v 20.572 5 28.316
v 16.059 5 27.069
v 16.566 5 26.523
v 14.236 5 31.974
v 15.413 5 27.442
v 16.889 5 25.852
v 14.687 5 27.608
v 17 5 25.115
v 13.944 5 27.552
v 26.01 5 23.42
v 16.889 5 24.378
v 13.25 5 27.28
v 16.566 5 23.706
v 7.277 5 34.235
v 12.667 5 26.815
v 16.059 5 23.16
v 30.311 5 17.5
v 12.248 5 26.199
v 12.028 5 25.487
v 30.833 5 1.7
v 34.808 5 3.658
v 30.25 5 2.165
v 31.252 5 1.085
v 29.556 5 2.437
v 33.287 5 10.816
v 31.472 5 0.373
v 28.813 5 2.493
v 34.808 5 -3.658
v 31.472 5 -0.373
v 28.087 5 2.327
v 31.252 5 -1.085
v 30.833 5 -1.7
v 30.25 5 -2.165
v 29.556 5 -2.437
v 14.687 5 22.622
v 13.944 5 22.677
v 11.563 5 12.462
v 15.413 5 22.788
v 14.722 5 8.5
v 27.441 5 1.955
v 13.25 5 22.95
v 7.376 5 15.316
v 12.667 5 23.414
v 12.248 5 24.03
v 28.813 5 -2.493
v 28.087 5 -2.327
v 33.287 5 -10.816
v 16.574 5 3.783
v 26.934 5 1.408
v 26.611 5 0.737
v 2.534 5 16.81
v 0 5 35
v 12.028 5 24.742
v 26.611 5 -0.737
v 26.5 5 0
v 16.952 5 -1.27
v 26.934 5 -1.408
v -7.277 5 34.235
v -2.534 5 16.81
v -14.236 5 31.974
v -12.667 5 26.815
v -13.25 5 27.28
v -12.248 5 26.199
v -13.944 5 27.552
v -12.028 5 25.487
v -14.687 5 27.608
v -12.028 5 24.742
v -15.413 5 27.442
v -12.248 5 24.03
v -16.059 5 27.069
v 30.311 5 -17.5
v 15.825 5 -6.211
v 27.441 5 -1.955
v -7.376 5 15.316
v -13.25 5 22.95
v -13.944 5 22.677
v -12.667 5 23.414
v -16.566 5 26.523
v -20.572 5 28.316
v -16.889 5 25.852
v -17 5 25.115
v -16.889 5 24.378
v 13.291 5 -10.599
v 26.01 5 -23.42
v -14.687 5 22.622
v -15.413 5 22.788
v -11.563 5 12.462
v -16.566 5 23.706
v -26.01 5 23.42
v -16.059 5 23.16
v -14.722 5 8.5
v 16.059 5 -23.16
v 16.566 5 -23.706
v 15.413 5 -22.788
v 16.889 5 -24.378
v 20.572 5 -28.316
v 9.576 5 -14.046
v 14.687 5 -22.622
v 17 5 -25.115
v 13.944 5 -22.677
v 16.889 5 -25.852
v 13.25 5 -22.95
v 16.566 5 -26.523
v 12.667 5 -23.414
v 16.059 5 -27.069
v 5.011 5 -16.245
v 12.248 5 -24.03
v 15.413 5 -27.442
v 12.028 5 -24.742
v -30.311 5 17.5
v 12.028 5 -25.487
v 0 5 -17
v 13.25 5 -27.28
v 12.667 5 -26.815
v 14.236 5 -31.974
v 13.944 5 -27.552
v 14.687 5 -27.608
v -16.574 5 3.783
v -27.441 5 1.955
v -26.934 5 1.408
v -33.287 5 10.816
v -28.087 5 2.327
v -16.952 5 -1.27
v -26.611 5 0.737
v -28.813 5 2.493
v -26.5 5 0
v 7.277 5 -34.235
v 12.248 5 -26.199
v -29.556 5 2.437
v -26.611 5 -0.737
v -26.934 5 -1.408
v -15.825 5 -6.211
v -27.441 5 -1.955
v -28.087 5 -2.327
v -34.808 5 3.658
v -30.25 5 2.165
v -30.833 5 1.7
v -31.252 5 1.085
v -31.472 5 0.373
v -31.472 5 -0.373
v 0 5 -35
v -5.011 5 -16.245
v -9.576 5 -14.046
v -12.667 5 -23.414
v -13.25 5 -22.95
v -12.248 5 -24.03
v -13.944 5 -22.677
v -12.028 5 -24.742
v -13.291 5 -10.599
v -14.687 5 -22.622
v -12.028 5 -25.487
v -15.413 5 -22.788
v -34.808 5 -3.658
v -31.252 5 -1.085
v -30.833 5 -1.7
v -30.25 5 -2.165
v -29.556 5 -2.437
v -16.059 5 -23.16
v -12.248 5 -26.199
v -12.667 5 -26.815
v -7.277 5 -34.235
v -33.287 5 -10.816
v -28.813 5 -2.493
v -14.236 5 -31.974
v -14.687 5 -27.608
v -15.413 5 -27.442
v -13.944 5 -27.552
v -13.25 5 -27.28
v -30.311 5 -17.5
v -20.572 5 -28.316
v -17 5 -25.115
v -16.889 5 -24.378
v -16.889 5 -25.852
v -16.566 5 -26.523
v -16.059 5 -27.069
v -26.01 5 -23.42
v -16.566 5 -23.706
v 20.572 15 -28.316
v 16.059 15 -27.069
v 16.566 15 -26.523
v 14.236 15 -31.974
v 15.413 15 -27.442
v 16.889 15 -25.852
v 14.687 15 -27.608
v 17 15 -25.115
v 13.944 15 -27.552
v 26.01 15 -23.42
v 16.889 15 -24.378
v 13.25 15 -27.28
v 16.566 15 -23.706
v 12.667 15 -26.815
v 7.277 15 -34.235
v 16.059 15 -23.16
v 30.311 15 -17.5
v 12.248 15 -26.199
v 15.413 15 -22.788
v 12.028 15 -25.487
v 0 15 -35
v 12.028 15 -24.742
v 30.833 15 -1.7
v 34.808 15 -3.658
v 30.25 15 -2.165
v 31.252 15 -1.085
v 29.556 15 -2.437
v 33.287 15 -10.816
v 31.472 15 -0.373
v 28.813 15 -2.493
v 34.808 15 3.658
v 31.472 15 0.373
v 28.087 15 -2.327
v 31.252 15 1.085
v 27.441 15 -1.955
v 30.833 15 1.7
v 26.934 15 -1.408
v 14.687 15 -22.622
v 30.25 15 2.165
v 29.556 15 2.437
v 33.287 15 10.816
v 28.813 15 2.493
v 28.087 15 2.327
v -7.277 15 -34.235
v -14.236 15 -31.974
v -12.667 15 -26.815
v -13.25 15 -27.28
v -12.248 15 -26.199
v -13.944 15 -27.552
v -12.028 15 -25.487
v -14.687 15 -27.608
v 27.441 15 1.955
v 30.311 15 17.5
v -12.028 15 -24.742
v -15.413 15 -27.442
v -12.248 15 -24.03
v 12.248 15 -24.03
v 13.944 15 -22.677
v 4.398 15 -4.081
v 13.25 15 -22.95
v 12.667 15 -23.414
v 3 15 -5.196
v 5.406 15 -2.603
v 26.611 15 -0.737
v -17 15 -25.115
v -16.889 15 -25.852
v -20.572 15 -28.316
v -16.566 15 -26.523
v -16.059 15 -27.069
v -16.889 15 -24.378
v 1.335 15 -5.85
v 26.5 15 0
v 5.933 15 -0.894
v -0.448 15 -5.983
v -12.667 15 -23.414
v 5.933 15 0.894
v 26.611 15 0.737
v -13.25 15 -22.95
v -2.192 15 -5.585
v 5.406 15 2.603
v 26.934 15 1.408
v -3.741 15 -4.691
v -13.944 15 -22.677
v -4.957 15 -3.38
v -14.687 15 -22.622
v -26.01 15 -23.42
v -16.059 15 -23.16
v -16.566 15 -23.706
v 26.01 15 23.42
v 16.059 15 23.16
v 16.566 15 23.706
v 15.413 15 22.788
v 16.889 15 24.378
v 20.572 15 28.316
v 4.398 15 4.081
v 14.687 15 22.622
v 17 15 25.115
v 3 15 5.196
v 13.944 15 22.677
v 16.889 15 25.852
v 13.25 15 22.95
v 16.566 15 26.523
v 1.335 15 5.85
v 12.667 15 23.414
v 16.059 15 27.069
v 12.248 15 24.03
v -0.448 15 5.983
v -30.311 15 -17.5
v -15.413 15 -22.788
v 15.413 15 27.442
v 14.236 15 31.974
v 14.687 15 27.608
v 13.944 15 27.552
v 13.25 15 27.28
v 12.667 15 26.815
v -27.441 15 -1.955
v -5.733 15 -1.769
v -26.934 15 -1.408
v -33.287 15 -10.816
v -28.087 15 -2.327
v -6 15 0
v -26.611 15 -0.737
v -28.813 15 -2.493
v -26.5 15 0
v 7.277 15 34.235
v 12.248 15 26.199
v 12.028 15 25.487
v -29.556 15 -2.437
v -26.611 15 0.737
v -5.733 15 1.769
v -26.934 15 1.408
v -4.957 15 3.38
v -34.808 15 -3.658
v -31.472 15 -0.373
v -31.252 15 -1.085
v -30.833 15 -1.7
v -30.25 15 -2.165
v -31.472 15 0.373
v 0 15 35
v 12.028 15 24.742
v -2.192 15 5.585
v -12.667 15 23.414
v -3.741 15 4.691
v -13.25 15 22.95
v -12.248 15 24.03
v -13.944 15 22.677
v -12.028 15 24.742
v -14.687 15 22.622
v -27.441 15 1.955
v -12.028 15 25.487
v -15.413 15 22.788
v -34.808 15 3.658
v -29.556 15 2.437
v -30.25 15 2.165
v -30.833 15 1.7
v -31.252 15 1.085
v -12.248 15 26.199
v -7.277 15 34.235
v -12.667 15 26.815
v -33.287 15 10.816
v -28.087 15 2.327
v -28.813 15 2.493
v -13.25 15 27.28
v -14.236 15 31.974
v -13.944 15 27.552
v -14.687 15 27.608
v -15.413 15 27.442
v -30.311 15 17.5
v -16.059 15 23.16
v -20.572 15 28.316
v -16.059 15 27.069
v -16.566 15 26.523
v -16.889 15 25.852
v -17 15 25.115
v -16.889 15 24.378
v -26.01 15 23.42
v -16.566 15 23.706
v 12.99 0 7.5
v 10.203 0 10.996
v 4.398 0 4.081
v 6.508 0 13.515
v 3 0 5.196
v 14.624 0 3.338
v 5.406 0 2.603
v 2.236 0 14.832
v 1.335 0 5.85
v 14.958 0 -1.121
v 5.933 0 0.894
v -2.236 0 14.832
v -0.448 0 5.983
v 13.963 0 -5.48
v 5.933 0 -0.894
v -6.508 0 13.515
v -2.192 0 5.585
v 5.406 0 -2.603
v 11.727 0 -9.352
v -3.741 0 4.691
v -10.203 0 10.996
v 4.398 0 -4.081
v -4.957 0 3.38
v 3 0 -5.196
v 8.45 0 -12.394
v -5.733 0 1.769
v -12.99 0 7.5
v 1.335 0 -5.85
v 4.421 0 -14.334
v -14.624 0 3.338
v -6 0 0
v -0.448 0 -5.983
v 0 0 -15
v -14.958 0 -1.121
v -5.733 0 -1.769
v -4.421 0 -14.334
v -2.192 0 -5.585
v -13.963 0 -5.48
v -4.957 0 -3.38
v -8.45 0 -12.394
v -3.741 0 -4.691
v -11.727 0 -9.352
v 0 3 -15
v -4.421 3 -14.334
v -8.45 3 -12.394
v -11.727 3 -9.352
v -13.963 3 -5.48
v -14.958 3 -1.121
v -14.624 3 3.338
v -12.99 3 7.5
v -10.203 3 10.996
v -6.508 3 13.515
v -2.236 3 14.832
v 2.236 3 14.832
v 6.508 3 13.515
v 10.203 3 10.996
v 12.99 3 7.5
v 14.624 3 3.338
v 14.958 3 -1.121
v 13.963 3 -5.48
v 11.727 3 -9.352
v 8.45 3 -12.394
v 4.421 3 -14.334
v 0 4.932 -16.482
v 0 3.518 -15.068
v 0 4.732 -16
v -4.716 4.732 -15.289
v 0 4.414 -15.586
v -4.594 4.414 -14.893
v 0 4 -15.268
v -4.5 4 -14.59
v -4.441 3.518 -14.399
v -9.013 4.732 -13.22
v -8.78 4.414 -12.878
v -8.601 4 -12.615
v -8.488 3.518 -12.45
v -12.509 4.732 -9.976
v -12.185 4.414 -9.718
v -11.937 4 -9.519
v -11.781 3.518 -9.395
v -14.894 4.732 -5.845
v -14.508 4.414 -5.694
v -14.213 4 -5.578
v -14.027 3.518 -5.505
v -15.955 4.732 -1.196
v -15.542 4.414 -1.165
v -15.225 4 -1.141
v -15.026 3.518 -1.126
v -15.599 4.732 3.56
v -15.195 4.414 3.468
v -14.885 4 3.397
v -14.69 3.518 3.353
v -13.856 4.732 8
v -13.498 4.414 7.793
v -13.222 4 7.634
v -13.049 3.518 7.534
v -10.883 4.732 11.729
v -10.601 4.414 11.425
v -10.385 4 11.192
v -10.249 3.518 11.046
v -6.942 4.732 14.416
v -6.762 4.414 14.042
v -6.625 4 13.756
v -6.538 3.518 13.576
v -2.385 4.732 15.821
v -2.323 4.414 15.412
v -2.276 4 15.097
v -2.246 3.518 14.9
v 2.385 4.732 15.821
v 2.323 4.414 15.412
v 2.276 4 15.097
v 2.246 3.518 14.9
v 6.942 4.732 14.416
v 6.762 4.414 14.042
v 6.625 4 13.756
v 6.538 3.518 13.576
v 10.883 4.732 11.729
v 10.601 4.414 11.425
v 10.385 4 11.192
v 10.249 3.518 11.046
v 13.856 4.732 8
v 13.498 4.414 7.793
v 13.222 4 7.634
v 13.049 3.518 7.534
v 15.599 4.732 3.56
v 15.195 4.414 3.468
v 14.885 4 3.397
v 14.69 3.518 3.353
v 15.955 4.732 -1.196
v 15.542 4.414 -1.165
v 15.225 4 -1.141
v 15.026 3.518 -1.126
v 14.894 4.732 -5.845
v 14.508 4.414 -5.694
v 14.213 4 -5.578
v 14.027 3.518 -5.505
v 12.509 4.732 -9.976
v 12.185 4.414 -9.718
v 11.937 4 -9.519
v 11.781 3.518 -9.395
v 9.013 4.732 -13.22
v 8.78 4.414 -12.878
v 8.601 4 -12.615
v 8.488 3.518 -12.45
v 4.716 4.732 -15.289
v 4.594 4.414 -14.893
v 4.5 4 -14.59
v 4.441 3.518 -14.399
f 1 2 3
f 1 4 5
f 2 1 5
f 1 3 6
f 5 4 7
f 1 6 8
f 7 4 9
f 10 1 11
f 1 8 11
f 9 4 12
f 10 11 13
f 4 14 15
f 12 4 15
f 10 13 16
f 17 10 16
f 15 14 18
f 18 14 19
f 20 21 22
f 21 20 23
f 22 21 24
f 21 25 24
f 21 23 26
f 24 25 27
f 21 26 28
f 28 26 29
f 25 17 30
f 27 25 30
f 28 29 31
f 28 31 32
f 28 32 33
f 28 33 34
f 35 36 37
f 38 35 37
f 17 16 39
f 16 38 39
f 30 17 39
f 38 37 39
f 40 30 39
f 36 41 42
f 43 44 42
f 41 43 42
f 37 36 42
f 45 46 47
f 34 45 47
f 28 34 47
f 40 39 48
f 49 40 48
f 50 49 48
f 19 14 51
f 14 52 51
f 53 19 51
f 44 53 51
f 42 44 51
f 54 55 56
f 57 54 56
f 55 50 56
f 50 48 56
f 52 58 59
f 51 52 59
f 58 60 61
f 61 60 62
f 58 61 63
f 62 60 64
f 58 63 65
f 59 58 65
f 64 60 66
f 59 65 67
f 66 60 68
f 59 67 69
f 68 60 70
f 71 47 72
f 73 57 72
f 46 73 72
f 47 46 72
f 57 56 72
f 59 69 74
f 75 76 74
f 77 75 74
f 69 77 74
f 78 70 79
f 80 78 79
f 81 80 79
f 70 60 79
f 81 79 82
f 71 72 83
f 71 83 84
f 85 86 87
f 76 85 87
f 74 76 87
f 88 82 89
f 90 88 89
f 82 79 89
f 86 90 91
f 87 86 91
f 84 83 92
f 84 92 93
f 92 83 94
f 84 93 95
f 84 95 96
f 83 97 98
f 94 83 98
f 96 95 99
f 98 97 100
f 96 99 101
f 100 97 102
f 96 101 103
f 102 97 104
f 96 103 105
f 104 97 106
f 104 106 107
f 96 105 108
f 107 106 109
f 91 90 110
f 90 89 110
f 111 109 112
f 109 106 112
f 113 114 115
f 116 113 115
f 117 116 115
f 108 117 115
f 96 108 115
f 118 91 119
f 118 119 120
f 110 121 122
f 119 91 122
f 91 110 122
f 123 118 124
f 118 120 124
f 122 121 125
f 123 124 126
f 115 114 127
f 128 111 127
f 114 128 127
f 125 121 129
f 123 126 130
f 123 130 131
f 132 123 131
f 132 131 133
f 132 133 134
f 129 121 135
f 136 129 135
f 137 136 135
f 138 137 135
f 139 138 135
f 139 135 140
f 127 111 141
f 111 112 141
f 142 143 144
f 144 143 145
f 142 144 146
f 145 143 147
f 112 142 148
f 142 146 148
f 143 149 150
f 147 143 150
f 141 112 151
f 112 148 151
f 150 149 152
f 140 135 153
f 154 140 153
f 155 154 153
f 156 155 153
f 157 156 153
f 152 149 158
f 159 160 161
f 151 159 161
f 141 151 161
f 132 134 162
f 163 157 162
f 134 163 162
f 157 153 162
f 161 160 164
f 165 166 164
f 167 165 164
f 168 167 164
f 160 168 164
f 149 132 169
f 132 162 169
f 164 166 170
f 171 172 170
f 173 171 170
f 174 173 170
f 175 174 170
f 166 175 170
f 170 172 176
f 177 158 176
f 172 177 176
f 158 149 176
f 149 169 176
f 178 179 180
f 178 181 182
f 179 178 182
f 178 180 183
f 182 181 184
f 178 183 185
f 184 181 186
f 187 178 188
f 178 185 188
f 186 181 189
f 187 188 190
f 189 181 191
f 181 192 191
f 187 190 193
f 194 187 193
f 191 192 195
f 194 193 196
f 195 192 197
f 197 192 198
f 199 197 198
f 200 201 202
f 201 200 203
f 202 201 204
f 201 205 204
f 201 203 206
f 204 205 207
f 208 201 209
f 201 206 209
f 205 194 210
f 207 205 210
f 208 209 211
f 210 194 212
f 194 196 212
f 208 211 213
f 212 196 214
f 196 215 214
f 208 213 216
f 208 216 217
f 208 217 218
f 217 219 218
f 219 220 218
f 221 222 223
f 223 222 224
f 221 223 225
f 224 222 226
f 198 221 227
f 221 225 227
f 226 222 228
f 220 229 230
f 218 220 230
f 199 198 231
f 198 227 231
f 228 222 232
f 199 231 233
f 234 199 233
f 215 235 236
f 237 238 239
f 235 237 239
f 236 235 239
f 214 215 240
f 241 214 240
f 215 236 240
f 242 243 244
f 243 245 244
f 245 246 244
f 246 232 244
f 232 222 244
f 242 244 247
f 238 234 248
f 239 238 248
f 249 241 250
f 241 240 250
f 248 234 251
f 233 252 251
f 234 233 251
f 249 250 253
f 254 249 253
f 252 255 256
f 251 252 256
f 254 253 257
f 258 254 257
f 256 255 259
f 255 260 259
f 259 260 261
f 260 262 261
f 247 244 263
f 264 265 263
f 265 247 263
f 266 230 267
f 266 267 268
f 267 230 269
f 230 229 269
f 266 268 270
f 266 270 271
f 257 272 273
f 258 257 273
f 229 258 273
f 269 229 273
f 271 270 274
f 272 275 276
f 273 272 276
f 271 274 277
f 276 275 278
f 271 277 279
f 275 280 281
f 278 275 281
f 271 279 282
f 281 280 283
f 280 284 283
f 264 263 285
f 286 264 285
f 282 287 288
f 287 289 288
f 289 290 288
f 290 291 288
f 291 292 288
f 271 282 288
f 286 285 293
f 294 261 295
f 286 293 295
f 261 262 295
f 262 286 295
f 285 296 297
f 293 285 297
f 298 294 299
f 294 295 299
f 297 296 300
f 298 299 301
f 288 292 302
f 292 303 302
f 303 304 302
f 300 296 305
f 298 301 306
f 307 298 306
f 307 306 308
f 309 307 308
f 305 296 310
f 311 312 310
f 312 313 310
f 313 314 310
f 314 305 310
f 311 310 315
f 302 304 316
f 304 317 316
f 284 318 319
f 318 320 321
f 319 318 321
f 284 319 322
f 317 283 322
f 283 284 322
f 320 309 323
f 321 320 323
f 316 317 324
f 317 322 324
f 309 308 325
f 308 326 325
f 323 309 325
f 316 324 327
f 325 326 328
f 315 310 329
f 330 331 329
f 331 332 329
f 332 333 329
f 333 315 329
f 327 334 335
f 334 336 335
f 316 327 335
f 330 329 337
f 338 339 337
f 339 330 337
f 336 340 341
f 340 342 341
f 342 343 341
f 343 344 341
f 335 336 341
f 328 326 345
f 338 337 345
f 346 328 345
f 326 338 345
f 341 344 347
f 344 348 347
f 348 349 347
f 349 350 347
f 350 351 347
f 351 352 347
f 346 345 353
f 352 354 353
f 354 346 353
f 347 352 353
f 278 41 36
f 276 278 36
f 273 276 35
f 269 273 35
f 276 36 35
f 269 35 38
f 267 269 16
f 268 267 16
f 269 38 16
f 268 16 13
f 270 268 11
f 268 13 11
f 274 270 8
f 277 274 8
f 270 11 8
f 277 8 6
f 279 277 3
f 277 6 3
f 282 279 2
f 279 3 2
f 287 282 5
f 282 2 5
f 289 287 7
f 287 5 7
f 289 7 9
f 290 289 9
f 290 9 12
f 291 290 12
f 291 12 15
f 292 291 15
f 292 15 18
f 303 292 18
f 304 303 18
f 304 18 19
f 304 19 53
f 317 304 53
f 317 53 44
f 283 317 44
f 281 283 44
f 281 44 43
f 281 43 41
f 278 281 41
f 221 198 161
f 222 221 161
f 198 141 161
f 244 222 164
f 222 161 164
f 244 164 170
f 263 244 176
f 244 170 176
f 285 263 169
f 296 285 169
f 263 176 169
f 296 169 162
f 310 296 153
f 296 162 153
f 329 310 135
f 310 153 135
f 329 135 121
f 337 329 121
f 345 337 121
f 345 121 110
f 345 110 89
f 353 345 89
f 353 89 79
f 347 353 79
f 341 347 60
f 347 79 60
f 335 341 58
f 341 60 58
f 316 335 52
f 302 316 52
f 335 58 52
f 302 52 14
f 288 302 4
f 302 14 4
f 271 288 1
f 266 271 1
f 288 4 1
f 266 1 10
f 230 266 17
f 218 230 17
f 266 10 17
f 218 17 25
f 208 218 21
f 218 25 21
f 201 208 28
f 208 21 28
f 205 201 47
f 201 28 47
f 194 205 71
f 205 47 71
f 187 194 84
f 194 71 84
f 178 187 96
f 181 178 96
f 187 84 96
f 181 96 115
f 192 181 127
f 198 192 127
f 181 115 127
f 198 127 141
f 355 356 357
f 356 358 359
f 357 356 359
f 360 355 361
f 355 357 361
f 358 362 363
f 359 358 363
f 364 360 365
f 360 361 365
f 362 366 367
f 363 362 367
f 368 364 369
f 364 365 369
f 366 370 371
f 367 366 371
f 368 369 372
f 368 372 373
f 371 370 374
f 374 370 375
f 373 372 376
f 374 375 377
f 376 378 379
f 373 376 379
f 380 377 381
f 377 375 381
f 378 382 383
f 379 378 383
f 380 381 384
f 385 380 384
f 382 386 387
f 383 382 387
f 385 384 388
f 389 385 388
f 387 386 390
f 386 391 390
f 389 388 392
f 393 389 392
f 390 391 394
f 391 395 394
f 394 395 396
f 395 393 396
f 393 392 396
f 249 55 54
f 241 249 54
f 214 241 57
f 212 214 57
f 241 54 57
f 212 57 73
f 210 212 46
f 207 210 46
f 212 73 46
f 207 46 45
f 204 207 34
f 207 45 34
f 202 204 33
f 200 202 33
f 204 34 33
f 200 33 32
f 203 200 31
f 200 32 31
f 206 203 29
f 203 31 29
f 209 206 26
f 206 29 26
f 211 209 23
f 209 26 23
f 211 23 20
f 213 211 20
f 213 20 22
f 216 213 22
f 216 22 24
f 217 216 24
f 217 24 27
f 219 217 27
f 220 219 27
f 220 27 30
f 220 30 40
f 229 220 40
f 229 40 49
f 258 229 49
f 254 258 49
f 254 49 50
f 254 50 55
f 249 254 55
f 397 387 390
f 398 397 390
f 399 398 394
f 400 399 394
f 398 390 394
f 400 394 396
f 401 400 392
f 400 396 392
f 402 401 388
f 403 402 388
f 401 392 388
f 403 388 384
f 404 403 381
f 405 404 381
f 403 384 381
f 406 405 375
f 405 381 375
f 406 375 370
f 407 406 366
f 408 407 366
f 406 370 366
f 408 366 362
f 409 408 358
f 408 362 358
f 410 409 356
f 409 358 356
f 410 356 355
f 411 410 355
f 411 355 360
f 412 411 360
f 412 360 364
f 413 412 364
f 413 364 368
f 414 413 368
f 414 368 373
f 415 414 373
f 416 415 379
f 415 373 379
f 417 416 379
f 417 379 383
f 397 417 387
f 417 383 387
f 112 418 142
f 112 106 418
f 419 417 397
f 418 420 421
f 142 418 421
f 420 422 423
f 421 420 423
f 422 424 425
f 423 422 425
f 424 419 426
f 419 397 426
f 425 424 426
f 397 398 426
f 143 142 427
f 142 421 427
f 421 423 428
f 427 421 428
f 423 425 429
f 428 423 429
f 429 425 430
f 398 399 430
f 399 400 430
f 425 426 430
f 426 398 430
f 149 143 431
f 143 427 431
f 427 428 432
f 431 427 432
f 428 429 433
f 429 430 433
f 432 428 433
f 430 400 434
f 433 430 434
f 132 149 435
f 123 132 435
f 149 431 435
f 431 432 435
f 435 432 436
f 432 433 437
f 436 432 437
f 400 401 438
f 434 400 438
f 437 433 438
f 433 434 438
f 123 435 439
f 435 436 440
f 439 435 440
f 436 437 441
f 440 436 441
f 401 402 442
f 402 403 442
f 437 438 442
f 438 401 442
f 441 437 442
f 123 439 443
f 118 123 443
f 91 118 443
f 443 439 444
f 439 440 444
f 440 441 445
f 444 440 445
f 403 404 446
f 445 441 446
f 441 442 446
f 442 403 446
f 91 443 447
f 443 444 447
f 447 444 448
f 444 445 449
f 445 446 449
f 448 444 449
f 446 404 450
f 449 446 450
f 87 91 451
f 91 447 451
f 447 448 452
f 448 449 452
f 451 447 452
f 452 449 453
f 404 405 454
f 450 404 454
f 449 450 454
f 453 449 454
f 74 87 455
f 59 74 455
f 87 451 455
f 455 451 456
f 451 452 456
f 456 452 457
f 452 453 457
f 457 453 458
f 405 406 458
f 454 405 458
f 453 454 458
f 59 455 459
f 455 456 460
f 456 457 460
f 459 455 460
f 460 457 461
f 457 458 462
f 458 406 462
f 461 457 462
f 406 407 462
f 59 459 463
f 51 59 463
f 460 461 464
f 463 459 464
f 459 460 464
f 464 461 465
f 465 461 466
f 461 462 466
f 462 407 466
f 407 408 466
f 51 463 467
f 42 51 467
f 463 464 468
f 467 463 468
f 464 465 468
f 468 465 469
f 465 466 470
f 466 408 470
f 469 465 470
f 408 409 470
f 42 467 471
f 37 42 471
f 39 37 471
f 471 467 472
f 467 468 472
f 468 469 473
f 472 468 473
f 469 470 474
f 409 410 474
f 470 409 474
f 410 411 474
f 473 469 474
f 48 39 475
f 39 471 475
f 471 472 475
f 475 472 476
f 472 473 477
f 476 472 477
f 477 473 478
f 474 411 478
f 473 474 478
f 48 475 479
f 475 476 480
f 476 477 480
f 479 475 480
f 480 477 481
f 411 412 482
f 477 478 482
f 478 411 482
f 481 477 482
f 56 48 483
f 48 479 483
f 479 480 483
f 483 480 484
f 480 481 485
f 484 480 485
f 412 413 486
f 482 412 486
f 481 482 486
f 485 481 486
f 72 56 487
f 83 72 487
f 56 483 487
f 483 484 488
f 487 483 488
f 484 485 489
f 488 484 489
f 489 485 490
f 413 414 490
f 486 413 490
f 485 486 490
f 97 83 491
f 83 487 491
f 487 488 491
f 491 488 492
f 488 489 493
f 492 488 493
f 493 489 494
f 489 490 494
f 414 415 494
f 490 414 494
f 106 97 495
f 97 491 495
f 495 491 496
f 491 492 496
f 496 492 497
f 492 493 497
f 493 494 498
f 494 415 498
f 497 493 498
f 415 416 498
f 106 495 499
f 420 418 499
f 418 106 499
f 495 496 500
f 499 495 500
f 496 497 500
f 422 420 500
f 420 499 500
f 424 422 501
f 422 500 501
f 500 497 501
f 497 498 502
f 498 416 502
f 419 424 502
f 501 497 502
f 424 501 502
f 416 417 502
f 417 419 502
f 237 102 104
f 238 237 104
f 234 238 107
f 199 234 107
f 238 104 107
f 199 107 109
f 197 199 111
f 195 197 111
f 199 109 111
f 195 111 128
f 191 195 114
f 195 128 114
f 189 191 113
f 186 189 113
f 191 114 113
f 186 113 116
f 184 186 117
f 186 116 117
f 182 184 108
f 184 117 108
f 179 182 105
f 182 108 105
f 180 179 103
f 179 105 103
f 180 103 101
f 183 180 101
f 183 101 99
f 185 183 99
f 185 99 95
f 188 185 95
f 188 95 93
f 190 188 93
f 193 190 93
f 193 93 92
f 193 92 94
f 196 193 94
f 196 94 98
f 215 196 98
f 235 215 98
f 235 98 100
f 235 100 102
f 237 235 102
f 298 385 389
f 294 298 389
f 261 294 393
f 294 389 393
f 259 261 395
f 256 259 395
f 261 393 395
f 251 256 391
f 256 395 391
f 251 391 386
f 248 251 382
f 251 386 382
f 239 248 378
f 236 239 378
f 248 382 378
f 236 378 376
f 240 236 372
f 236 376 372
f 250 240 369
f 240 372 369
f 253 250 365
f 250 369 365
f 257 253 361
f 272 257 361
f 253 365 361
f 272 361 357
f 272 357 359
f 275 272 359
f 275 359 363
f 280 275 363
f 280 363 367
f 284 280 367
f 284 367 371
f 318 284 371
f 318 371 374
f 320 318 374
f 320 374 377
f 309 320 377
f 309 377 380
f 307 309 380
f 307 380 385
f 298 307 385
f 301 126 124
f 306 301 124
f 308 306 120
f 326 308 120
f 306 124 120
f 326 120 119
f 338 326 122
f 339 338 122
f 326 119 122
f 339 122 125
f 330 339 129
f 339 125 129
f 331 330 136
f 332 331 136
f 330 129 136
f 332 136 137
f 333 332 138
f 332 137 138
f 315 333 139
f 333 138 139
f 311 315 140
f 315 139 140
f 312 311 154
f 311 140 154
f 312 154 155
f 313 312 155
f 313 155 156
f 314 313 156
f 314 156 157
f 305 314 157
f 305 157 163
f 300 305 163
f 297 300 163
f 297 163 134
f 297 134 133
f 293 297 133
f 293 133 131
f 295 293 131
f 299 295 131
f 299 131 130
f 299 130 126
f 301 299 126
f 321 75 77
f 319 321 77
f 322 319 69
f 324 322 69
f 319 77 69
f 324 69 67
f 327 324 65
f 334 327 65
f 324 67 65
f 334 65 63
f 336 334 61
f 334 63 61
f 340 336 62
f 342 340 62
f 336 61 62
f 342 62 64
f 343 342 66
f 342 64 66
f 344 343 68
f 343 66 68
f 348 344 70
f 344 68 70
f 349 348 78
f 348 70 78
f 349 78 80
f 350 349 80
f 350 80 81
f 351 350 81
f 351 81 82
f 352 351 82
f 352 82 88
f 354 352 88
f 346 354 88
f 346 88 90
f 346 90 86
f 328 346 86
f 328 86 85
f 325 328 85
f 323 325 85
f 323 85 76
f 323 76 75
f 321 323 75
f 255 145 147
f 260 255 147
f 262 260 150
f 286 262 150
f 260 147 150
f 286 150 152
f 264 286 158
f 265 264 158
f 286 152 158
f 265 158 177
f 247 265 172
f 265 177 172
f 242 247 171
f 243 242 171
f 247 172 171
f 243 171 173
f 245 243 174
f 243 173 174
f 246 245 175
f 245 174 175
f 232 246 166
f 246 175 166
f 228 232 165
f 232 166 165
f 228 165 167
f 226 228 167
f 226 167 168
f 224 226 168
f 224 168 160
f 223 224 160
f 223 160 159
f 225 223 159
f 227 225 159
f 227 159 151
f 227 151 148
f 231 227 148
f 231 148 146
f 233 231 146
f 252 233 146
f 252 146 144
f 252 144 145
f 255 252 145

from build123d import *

# Parameters (mm, degrees)
REDONDEO1_R            = 2
TALADRO_ROSCADO_M61_D  = 5
TALADRO_ROSCADO_M141_D = 12
MATRIZC1_COUNT         = 6


with BuildPart() as part:
    # Croquis1 → Revolución1 (revolve)
    with BuildSketch(Plane.XY, mode=Mode.PRIVATE) as revoluci_n1_sk:
        Polygon((2, 0), (2, 15), (35, 15), (35, 5), (15, 5), (15, 0), align=None)
    revolve(revoluci_n1_sk.sketch.rotate(Axis((0, 0, 0), (0, 1, 0)), 90), axis=Axis((0, 0, 0), (0, 1, 0)))

    # Redondeo1
    redondeo1_edges = [part.edges().sort_by_distance(p)[0] for p in [
        (0, 5, 15),
    ]]
    fillet(redondeo1_edges, radius=REDONDEO1_R)

    # Taladro roscado M61 (through all)
    with Locations(Plane(origin=(0, 15, 0), x_dir=(1, 0, 0), z_dir=(0, 1, 0))):
        with Locations((29, 0)):
            taladro_roscado_m61 = Hole(TALADRO_ROSCADO_M61_D / 2)

    # Taladro roscado M141 (through all)
    with Locations(Plane(origin=(0, 15, 0), x_dir=(1, 0, 0), z_dir=(0, 1, 0))):
        with Locations((0, 0)):
            Hole(TALADRO_ROSCADO_M141_D / 2)

    # MatrizC1: Taladro roscado M61 ×6 about axis
    matrizc1_axis = Axis((0, 0, 0), (0, 1, 0))
    for i in range(1, MATRIZC1_COUNT):
        add(taladro_roscado_m61.rotate(matrizc1_axis, i * 360 / MATRIZC1_COUNT), mode=Mode.SUBTRACT)


solid = part.part
